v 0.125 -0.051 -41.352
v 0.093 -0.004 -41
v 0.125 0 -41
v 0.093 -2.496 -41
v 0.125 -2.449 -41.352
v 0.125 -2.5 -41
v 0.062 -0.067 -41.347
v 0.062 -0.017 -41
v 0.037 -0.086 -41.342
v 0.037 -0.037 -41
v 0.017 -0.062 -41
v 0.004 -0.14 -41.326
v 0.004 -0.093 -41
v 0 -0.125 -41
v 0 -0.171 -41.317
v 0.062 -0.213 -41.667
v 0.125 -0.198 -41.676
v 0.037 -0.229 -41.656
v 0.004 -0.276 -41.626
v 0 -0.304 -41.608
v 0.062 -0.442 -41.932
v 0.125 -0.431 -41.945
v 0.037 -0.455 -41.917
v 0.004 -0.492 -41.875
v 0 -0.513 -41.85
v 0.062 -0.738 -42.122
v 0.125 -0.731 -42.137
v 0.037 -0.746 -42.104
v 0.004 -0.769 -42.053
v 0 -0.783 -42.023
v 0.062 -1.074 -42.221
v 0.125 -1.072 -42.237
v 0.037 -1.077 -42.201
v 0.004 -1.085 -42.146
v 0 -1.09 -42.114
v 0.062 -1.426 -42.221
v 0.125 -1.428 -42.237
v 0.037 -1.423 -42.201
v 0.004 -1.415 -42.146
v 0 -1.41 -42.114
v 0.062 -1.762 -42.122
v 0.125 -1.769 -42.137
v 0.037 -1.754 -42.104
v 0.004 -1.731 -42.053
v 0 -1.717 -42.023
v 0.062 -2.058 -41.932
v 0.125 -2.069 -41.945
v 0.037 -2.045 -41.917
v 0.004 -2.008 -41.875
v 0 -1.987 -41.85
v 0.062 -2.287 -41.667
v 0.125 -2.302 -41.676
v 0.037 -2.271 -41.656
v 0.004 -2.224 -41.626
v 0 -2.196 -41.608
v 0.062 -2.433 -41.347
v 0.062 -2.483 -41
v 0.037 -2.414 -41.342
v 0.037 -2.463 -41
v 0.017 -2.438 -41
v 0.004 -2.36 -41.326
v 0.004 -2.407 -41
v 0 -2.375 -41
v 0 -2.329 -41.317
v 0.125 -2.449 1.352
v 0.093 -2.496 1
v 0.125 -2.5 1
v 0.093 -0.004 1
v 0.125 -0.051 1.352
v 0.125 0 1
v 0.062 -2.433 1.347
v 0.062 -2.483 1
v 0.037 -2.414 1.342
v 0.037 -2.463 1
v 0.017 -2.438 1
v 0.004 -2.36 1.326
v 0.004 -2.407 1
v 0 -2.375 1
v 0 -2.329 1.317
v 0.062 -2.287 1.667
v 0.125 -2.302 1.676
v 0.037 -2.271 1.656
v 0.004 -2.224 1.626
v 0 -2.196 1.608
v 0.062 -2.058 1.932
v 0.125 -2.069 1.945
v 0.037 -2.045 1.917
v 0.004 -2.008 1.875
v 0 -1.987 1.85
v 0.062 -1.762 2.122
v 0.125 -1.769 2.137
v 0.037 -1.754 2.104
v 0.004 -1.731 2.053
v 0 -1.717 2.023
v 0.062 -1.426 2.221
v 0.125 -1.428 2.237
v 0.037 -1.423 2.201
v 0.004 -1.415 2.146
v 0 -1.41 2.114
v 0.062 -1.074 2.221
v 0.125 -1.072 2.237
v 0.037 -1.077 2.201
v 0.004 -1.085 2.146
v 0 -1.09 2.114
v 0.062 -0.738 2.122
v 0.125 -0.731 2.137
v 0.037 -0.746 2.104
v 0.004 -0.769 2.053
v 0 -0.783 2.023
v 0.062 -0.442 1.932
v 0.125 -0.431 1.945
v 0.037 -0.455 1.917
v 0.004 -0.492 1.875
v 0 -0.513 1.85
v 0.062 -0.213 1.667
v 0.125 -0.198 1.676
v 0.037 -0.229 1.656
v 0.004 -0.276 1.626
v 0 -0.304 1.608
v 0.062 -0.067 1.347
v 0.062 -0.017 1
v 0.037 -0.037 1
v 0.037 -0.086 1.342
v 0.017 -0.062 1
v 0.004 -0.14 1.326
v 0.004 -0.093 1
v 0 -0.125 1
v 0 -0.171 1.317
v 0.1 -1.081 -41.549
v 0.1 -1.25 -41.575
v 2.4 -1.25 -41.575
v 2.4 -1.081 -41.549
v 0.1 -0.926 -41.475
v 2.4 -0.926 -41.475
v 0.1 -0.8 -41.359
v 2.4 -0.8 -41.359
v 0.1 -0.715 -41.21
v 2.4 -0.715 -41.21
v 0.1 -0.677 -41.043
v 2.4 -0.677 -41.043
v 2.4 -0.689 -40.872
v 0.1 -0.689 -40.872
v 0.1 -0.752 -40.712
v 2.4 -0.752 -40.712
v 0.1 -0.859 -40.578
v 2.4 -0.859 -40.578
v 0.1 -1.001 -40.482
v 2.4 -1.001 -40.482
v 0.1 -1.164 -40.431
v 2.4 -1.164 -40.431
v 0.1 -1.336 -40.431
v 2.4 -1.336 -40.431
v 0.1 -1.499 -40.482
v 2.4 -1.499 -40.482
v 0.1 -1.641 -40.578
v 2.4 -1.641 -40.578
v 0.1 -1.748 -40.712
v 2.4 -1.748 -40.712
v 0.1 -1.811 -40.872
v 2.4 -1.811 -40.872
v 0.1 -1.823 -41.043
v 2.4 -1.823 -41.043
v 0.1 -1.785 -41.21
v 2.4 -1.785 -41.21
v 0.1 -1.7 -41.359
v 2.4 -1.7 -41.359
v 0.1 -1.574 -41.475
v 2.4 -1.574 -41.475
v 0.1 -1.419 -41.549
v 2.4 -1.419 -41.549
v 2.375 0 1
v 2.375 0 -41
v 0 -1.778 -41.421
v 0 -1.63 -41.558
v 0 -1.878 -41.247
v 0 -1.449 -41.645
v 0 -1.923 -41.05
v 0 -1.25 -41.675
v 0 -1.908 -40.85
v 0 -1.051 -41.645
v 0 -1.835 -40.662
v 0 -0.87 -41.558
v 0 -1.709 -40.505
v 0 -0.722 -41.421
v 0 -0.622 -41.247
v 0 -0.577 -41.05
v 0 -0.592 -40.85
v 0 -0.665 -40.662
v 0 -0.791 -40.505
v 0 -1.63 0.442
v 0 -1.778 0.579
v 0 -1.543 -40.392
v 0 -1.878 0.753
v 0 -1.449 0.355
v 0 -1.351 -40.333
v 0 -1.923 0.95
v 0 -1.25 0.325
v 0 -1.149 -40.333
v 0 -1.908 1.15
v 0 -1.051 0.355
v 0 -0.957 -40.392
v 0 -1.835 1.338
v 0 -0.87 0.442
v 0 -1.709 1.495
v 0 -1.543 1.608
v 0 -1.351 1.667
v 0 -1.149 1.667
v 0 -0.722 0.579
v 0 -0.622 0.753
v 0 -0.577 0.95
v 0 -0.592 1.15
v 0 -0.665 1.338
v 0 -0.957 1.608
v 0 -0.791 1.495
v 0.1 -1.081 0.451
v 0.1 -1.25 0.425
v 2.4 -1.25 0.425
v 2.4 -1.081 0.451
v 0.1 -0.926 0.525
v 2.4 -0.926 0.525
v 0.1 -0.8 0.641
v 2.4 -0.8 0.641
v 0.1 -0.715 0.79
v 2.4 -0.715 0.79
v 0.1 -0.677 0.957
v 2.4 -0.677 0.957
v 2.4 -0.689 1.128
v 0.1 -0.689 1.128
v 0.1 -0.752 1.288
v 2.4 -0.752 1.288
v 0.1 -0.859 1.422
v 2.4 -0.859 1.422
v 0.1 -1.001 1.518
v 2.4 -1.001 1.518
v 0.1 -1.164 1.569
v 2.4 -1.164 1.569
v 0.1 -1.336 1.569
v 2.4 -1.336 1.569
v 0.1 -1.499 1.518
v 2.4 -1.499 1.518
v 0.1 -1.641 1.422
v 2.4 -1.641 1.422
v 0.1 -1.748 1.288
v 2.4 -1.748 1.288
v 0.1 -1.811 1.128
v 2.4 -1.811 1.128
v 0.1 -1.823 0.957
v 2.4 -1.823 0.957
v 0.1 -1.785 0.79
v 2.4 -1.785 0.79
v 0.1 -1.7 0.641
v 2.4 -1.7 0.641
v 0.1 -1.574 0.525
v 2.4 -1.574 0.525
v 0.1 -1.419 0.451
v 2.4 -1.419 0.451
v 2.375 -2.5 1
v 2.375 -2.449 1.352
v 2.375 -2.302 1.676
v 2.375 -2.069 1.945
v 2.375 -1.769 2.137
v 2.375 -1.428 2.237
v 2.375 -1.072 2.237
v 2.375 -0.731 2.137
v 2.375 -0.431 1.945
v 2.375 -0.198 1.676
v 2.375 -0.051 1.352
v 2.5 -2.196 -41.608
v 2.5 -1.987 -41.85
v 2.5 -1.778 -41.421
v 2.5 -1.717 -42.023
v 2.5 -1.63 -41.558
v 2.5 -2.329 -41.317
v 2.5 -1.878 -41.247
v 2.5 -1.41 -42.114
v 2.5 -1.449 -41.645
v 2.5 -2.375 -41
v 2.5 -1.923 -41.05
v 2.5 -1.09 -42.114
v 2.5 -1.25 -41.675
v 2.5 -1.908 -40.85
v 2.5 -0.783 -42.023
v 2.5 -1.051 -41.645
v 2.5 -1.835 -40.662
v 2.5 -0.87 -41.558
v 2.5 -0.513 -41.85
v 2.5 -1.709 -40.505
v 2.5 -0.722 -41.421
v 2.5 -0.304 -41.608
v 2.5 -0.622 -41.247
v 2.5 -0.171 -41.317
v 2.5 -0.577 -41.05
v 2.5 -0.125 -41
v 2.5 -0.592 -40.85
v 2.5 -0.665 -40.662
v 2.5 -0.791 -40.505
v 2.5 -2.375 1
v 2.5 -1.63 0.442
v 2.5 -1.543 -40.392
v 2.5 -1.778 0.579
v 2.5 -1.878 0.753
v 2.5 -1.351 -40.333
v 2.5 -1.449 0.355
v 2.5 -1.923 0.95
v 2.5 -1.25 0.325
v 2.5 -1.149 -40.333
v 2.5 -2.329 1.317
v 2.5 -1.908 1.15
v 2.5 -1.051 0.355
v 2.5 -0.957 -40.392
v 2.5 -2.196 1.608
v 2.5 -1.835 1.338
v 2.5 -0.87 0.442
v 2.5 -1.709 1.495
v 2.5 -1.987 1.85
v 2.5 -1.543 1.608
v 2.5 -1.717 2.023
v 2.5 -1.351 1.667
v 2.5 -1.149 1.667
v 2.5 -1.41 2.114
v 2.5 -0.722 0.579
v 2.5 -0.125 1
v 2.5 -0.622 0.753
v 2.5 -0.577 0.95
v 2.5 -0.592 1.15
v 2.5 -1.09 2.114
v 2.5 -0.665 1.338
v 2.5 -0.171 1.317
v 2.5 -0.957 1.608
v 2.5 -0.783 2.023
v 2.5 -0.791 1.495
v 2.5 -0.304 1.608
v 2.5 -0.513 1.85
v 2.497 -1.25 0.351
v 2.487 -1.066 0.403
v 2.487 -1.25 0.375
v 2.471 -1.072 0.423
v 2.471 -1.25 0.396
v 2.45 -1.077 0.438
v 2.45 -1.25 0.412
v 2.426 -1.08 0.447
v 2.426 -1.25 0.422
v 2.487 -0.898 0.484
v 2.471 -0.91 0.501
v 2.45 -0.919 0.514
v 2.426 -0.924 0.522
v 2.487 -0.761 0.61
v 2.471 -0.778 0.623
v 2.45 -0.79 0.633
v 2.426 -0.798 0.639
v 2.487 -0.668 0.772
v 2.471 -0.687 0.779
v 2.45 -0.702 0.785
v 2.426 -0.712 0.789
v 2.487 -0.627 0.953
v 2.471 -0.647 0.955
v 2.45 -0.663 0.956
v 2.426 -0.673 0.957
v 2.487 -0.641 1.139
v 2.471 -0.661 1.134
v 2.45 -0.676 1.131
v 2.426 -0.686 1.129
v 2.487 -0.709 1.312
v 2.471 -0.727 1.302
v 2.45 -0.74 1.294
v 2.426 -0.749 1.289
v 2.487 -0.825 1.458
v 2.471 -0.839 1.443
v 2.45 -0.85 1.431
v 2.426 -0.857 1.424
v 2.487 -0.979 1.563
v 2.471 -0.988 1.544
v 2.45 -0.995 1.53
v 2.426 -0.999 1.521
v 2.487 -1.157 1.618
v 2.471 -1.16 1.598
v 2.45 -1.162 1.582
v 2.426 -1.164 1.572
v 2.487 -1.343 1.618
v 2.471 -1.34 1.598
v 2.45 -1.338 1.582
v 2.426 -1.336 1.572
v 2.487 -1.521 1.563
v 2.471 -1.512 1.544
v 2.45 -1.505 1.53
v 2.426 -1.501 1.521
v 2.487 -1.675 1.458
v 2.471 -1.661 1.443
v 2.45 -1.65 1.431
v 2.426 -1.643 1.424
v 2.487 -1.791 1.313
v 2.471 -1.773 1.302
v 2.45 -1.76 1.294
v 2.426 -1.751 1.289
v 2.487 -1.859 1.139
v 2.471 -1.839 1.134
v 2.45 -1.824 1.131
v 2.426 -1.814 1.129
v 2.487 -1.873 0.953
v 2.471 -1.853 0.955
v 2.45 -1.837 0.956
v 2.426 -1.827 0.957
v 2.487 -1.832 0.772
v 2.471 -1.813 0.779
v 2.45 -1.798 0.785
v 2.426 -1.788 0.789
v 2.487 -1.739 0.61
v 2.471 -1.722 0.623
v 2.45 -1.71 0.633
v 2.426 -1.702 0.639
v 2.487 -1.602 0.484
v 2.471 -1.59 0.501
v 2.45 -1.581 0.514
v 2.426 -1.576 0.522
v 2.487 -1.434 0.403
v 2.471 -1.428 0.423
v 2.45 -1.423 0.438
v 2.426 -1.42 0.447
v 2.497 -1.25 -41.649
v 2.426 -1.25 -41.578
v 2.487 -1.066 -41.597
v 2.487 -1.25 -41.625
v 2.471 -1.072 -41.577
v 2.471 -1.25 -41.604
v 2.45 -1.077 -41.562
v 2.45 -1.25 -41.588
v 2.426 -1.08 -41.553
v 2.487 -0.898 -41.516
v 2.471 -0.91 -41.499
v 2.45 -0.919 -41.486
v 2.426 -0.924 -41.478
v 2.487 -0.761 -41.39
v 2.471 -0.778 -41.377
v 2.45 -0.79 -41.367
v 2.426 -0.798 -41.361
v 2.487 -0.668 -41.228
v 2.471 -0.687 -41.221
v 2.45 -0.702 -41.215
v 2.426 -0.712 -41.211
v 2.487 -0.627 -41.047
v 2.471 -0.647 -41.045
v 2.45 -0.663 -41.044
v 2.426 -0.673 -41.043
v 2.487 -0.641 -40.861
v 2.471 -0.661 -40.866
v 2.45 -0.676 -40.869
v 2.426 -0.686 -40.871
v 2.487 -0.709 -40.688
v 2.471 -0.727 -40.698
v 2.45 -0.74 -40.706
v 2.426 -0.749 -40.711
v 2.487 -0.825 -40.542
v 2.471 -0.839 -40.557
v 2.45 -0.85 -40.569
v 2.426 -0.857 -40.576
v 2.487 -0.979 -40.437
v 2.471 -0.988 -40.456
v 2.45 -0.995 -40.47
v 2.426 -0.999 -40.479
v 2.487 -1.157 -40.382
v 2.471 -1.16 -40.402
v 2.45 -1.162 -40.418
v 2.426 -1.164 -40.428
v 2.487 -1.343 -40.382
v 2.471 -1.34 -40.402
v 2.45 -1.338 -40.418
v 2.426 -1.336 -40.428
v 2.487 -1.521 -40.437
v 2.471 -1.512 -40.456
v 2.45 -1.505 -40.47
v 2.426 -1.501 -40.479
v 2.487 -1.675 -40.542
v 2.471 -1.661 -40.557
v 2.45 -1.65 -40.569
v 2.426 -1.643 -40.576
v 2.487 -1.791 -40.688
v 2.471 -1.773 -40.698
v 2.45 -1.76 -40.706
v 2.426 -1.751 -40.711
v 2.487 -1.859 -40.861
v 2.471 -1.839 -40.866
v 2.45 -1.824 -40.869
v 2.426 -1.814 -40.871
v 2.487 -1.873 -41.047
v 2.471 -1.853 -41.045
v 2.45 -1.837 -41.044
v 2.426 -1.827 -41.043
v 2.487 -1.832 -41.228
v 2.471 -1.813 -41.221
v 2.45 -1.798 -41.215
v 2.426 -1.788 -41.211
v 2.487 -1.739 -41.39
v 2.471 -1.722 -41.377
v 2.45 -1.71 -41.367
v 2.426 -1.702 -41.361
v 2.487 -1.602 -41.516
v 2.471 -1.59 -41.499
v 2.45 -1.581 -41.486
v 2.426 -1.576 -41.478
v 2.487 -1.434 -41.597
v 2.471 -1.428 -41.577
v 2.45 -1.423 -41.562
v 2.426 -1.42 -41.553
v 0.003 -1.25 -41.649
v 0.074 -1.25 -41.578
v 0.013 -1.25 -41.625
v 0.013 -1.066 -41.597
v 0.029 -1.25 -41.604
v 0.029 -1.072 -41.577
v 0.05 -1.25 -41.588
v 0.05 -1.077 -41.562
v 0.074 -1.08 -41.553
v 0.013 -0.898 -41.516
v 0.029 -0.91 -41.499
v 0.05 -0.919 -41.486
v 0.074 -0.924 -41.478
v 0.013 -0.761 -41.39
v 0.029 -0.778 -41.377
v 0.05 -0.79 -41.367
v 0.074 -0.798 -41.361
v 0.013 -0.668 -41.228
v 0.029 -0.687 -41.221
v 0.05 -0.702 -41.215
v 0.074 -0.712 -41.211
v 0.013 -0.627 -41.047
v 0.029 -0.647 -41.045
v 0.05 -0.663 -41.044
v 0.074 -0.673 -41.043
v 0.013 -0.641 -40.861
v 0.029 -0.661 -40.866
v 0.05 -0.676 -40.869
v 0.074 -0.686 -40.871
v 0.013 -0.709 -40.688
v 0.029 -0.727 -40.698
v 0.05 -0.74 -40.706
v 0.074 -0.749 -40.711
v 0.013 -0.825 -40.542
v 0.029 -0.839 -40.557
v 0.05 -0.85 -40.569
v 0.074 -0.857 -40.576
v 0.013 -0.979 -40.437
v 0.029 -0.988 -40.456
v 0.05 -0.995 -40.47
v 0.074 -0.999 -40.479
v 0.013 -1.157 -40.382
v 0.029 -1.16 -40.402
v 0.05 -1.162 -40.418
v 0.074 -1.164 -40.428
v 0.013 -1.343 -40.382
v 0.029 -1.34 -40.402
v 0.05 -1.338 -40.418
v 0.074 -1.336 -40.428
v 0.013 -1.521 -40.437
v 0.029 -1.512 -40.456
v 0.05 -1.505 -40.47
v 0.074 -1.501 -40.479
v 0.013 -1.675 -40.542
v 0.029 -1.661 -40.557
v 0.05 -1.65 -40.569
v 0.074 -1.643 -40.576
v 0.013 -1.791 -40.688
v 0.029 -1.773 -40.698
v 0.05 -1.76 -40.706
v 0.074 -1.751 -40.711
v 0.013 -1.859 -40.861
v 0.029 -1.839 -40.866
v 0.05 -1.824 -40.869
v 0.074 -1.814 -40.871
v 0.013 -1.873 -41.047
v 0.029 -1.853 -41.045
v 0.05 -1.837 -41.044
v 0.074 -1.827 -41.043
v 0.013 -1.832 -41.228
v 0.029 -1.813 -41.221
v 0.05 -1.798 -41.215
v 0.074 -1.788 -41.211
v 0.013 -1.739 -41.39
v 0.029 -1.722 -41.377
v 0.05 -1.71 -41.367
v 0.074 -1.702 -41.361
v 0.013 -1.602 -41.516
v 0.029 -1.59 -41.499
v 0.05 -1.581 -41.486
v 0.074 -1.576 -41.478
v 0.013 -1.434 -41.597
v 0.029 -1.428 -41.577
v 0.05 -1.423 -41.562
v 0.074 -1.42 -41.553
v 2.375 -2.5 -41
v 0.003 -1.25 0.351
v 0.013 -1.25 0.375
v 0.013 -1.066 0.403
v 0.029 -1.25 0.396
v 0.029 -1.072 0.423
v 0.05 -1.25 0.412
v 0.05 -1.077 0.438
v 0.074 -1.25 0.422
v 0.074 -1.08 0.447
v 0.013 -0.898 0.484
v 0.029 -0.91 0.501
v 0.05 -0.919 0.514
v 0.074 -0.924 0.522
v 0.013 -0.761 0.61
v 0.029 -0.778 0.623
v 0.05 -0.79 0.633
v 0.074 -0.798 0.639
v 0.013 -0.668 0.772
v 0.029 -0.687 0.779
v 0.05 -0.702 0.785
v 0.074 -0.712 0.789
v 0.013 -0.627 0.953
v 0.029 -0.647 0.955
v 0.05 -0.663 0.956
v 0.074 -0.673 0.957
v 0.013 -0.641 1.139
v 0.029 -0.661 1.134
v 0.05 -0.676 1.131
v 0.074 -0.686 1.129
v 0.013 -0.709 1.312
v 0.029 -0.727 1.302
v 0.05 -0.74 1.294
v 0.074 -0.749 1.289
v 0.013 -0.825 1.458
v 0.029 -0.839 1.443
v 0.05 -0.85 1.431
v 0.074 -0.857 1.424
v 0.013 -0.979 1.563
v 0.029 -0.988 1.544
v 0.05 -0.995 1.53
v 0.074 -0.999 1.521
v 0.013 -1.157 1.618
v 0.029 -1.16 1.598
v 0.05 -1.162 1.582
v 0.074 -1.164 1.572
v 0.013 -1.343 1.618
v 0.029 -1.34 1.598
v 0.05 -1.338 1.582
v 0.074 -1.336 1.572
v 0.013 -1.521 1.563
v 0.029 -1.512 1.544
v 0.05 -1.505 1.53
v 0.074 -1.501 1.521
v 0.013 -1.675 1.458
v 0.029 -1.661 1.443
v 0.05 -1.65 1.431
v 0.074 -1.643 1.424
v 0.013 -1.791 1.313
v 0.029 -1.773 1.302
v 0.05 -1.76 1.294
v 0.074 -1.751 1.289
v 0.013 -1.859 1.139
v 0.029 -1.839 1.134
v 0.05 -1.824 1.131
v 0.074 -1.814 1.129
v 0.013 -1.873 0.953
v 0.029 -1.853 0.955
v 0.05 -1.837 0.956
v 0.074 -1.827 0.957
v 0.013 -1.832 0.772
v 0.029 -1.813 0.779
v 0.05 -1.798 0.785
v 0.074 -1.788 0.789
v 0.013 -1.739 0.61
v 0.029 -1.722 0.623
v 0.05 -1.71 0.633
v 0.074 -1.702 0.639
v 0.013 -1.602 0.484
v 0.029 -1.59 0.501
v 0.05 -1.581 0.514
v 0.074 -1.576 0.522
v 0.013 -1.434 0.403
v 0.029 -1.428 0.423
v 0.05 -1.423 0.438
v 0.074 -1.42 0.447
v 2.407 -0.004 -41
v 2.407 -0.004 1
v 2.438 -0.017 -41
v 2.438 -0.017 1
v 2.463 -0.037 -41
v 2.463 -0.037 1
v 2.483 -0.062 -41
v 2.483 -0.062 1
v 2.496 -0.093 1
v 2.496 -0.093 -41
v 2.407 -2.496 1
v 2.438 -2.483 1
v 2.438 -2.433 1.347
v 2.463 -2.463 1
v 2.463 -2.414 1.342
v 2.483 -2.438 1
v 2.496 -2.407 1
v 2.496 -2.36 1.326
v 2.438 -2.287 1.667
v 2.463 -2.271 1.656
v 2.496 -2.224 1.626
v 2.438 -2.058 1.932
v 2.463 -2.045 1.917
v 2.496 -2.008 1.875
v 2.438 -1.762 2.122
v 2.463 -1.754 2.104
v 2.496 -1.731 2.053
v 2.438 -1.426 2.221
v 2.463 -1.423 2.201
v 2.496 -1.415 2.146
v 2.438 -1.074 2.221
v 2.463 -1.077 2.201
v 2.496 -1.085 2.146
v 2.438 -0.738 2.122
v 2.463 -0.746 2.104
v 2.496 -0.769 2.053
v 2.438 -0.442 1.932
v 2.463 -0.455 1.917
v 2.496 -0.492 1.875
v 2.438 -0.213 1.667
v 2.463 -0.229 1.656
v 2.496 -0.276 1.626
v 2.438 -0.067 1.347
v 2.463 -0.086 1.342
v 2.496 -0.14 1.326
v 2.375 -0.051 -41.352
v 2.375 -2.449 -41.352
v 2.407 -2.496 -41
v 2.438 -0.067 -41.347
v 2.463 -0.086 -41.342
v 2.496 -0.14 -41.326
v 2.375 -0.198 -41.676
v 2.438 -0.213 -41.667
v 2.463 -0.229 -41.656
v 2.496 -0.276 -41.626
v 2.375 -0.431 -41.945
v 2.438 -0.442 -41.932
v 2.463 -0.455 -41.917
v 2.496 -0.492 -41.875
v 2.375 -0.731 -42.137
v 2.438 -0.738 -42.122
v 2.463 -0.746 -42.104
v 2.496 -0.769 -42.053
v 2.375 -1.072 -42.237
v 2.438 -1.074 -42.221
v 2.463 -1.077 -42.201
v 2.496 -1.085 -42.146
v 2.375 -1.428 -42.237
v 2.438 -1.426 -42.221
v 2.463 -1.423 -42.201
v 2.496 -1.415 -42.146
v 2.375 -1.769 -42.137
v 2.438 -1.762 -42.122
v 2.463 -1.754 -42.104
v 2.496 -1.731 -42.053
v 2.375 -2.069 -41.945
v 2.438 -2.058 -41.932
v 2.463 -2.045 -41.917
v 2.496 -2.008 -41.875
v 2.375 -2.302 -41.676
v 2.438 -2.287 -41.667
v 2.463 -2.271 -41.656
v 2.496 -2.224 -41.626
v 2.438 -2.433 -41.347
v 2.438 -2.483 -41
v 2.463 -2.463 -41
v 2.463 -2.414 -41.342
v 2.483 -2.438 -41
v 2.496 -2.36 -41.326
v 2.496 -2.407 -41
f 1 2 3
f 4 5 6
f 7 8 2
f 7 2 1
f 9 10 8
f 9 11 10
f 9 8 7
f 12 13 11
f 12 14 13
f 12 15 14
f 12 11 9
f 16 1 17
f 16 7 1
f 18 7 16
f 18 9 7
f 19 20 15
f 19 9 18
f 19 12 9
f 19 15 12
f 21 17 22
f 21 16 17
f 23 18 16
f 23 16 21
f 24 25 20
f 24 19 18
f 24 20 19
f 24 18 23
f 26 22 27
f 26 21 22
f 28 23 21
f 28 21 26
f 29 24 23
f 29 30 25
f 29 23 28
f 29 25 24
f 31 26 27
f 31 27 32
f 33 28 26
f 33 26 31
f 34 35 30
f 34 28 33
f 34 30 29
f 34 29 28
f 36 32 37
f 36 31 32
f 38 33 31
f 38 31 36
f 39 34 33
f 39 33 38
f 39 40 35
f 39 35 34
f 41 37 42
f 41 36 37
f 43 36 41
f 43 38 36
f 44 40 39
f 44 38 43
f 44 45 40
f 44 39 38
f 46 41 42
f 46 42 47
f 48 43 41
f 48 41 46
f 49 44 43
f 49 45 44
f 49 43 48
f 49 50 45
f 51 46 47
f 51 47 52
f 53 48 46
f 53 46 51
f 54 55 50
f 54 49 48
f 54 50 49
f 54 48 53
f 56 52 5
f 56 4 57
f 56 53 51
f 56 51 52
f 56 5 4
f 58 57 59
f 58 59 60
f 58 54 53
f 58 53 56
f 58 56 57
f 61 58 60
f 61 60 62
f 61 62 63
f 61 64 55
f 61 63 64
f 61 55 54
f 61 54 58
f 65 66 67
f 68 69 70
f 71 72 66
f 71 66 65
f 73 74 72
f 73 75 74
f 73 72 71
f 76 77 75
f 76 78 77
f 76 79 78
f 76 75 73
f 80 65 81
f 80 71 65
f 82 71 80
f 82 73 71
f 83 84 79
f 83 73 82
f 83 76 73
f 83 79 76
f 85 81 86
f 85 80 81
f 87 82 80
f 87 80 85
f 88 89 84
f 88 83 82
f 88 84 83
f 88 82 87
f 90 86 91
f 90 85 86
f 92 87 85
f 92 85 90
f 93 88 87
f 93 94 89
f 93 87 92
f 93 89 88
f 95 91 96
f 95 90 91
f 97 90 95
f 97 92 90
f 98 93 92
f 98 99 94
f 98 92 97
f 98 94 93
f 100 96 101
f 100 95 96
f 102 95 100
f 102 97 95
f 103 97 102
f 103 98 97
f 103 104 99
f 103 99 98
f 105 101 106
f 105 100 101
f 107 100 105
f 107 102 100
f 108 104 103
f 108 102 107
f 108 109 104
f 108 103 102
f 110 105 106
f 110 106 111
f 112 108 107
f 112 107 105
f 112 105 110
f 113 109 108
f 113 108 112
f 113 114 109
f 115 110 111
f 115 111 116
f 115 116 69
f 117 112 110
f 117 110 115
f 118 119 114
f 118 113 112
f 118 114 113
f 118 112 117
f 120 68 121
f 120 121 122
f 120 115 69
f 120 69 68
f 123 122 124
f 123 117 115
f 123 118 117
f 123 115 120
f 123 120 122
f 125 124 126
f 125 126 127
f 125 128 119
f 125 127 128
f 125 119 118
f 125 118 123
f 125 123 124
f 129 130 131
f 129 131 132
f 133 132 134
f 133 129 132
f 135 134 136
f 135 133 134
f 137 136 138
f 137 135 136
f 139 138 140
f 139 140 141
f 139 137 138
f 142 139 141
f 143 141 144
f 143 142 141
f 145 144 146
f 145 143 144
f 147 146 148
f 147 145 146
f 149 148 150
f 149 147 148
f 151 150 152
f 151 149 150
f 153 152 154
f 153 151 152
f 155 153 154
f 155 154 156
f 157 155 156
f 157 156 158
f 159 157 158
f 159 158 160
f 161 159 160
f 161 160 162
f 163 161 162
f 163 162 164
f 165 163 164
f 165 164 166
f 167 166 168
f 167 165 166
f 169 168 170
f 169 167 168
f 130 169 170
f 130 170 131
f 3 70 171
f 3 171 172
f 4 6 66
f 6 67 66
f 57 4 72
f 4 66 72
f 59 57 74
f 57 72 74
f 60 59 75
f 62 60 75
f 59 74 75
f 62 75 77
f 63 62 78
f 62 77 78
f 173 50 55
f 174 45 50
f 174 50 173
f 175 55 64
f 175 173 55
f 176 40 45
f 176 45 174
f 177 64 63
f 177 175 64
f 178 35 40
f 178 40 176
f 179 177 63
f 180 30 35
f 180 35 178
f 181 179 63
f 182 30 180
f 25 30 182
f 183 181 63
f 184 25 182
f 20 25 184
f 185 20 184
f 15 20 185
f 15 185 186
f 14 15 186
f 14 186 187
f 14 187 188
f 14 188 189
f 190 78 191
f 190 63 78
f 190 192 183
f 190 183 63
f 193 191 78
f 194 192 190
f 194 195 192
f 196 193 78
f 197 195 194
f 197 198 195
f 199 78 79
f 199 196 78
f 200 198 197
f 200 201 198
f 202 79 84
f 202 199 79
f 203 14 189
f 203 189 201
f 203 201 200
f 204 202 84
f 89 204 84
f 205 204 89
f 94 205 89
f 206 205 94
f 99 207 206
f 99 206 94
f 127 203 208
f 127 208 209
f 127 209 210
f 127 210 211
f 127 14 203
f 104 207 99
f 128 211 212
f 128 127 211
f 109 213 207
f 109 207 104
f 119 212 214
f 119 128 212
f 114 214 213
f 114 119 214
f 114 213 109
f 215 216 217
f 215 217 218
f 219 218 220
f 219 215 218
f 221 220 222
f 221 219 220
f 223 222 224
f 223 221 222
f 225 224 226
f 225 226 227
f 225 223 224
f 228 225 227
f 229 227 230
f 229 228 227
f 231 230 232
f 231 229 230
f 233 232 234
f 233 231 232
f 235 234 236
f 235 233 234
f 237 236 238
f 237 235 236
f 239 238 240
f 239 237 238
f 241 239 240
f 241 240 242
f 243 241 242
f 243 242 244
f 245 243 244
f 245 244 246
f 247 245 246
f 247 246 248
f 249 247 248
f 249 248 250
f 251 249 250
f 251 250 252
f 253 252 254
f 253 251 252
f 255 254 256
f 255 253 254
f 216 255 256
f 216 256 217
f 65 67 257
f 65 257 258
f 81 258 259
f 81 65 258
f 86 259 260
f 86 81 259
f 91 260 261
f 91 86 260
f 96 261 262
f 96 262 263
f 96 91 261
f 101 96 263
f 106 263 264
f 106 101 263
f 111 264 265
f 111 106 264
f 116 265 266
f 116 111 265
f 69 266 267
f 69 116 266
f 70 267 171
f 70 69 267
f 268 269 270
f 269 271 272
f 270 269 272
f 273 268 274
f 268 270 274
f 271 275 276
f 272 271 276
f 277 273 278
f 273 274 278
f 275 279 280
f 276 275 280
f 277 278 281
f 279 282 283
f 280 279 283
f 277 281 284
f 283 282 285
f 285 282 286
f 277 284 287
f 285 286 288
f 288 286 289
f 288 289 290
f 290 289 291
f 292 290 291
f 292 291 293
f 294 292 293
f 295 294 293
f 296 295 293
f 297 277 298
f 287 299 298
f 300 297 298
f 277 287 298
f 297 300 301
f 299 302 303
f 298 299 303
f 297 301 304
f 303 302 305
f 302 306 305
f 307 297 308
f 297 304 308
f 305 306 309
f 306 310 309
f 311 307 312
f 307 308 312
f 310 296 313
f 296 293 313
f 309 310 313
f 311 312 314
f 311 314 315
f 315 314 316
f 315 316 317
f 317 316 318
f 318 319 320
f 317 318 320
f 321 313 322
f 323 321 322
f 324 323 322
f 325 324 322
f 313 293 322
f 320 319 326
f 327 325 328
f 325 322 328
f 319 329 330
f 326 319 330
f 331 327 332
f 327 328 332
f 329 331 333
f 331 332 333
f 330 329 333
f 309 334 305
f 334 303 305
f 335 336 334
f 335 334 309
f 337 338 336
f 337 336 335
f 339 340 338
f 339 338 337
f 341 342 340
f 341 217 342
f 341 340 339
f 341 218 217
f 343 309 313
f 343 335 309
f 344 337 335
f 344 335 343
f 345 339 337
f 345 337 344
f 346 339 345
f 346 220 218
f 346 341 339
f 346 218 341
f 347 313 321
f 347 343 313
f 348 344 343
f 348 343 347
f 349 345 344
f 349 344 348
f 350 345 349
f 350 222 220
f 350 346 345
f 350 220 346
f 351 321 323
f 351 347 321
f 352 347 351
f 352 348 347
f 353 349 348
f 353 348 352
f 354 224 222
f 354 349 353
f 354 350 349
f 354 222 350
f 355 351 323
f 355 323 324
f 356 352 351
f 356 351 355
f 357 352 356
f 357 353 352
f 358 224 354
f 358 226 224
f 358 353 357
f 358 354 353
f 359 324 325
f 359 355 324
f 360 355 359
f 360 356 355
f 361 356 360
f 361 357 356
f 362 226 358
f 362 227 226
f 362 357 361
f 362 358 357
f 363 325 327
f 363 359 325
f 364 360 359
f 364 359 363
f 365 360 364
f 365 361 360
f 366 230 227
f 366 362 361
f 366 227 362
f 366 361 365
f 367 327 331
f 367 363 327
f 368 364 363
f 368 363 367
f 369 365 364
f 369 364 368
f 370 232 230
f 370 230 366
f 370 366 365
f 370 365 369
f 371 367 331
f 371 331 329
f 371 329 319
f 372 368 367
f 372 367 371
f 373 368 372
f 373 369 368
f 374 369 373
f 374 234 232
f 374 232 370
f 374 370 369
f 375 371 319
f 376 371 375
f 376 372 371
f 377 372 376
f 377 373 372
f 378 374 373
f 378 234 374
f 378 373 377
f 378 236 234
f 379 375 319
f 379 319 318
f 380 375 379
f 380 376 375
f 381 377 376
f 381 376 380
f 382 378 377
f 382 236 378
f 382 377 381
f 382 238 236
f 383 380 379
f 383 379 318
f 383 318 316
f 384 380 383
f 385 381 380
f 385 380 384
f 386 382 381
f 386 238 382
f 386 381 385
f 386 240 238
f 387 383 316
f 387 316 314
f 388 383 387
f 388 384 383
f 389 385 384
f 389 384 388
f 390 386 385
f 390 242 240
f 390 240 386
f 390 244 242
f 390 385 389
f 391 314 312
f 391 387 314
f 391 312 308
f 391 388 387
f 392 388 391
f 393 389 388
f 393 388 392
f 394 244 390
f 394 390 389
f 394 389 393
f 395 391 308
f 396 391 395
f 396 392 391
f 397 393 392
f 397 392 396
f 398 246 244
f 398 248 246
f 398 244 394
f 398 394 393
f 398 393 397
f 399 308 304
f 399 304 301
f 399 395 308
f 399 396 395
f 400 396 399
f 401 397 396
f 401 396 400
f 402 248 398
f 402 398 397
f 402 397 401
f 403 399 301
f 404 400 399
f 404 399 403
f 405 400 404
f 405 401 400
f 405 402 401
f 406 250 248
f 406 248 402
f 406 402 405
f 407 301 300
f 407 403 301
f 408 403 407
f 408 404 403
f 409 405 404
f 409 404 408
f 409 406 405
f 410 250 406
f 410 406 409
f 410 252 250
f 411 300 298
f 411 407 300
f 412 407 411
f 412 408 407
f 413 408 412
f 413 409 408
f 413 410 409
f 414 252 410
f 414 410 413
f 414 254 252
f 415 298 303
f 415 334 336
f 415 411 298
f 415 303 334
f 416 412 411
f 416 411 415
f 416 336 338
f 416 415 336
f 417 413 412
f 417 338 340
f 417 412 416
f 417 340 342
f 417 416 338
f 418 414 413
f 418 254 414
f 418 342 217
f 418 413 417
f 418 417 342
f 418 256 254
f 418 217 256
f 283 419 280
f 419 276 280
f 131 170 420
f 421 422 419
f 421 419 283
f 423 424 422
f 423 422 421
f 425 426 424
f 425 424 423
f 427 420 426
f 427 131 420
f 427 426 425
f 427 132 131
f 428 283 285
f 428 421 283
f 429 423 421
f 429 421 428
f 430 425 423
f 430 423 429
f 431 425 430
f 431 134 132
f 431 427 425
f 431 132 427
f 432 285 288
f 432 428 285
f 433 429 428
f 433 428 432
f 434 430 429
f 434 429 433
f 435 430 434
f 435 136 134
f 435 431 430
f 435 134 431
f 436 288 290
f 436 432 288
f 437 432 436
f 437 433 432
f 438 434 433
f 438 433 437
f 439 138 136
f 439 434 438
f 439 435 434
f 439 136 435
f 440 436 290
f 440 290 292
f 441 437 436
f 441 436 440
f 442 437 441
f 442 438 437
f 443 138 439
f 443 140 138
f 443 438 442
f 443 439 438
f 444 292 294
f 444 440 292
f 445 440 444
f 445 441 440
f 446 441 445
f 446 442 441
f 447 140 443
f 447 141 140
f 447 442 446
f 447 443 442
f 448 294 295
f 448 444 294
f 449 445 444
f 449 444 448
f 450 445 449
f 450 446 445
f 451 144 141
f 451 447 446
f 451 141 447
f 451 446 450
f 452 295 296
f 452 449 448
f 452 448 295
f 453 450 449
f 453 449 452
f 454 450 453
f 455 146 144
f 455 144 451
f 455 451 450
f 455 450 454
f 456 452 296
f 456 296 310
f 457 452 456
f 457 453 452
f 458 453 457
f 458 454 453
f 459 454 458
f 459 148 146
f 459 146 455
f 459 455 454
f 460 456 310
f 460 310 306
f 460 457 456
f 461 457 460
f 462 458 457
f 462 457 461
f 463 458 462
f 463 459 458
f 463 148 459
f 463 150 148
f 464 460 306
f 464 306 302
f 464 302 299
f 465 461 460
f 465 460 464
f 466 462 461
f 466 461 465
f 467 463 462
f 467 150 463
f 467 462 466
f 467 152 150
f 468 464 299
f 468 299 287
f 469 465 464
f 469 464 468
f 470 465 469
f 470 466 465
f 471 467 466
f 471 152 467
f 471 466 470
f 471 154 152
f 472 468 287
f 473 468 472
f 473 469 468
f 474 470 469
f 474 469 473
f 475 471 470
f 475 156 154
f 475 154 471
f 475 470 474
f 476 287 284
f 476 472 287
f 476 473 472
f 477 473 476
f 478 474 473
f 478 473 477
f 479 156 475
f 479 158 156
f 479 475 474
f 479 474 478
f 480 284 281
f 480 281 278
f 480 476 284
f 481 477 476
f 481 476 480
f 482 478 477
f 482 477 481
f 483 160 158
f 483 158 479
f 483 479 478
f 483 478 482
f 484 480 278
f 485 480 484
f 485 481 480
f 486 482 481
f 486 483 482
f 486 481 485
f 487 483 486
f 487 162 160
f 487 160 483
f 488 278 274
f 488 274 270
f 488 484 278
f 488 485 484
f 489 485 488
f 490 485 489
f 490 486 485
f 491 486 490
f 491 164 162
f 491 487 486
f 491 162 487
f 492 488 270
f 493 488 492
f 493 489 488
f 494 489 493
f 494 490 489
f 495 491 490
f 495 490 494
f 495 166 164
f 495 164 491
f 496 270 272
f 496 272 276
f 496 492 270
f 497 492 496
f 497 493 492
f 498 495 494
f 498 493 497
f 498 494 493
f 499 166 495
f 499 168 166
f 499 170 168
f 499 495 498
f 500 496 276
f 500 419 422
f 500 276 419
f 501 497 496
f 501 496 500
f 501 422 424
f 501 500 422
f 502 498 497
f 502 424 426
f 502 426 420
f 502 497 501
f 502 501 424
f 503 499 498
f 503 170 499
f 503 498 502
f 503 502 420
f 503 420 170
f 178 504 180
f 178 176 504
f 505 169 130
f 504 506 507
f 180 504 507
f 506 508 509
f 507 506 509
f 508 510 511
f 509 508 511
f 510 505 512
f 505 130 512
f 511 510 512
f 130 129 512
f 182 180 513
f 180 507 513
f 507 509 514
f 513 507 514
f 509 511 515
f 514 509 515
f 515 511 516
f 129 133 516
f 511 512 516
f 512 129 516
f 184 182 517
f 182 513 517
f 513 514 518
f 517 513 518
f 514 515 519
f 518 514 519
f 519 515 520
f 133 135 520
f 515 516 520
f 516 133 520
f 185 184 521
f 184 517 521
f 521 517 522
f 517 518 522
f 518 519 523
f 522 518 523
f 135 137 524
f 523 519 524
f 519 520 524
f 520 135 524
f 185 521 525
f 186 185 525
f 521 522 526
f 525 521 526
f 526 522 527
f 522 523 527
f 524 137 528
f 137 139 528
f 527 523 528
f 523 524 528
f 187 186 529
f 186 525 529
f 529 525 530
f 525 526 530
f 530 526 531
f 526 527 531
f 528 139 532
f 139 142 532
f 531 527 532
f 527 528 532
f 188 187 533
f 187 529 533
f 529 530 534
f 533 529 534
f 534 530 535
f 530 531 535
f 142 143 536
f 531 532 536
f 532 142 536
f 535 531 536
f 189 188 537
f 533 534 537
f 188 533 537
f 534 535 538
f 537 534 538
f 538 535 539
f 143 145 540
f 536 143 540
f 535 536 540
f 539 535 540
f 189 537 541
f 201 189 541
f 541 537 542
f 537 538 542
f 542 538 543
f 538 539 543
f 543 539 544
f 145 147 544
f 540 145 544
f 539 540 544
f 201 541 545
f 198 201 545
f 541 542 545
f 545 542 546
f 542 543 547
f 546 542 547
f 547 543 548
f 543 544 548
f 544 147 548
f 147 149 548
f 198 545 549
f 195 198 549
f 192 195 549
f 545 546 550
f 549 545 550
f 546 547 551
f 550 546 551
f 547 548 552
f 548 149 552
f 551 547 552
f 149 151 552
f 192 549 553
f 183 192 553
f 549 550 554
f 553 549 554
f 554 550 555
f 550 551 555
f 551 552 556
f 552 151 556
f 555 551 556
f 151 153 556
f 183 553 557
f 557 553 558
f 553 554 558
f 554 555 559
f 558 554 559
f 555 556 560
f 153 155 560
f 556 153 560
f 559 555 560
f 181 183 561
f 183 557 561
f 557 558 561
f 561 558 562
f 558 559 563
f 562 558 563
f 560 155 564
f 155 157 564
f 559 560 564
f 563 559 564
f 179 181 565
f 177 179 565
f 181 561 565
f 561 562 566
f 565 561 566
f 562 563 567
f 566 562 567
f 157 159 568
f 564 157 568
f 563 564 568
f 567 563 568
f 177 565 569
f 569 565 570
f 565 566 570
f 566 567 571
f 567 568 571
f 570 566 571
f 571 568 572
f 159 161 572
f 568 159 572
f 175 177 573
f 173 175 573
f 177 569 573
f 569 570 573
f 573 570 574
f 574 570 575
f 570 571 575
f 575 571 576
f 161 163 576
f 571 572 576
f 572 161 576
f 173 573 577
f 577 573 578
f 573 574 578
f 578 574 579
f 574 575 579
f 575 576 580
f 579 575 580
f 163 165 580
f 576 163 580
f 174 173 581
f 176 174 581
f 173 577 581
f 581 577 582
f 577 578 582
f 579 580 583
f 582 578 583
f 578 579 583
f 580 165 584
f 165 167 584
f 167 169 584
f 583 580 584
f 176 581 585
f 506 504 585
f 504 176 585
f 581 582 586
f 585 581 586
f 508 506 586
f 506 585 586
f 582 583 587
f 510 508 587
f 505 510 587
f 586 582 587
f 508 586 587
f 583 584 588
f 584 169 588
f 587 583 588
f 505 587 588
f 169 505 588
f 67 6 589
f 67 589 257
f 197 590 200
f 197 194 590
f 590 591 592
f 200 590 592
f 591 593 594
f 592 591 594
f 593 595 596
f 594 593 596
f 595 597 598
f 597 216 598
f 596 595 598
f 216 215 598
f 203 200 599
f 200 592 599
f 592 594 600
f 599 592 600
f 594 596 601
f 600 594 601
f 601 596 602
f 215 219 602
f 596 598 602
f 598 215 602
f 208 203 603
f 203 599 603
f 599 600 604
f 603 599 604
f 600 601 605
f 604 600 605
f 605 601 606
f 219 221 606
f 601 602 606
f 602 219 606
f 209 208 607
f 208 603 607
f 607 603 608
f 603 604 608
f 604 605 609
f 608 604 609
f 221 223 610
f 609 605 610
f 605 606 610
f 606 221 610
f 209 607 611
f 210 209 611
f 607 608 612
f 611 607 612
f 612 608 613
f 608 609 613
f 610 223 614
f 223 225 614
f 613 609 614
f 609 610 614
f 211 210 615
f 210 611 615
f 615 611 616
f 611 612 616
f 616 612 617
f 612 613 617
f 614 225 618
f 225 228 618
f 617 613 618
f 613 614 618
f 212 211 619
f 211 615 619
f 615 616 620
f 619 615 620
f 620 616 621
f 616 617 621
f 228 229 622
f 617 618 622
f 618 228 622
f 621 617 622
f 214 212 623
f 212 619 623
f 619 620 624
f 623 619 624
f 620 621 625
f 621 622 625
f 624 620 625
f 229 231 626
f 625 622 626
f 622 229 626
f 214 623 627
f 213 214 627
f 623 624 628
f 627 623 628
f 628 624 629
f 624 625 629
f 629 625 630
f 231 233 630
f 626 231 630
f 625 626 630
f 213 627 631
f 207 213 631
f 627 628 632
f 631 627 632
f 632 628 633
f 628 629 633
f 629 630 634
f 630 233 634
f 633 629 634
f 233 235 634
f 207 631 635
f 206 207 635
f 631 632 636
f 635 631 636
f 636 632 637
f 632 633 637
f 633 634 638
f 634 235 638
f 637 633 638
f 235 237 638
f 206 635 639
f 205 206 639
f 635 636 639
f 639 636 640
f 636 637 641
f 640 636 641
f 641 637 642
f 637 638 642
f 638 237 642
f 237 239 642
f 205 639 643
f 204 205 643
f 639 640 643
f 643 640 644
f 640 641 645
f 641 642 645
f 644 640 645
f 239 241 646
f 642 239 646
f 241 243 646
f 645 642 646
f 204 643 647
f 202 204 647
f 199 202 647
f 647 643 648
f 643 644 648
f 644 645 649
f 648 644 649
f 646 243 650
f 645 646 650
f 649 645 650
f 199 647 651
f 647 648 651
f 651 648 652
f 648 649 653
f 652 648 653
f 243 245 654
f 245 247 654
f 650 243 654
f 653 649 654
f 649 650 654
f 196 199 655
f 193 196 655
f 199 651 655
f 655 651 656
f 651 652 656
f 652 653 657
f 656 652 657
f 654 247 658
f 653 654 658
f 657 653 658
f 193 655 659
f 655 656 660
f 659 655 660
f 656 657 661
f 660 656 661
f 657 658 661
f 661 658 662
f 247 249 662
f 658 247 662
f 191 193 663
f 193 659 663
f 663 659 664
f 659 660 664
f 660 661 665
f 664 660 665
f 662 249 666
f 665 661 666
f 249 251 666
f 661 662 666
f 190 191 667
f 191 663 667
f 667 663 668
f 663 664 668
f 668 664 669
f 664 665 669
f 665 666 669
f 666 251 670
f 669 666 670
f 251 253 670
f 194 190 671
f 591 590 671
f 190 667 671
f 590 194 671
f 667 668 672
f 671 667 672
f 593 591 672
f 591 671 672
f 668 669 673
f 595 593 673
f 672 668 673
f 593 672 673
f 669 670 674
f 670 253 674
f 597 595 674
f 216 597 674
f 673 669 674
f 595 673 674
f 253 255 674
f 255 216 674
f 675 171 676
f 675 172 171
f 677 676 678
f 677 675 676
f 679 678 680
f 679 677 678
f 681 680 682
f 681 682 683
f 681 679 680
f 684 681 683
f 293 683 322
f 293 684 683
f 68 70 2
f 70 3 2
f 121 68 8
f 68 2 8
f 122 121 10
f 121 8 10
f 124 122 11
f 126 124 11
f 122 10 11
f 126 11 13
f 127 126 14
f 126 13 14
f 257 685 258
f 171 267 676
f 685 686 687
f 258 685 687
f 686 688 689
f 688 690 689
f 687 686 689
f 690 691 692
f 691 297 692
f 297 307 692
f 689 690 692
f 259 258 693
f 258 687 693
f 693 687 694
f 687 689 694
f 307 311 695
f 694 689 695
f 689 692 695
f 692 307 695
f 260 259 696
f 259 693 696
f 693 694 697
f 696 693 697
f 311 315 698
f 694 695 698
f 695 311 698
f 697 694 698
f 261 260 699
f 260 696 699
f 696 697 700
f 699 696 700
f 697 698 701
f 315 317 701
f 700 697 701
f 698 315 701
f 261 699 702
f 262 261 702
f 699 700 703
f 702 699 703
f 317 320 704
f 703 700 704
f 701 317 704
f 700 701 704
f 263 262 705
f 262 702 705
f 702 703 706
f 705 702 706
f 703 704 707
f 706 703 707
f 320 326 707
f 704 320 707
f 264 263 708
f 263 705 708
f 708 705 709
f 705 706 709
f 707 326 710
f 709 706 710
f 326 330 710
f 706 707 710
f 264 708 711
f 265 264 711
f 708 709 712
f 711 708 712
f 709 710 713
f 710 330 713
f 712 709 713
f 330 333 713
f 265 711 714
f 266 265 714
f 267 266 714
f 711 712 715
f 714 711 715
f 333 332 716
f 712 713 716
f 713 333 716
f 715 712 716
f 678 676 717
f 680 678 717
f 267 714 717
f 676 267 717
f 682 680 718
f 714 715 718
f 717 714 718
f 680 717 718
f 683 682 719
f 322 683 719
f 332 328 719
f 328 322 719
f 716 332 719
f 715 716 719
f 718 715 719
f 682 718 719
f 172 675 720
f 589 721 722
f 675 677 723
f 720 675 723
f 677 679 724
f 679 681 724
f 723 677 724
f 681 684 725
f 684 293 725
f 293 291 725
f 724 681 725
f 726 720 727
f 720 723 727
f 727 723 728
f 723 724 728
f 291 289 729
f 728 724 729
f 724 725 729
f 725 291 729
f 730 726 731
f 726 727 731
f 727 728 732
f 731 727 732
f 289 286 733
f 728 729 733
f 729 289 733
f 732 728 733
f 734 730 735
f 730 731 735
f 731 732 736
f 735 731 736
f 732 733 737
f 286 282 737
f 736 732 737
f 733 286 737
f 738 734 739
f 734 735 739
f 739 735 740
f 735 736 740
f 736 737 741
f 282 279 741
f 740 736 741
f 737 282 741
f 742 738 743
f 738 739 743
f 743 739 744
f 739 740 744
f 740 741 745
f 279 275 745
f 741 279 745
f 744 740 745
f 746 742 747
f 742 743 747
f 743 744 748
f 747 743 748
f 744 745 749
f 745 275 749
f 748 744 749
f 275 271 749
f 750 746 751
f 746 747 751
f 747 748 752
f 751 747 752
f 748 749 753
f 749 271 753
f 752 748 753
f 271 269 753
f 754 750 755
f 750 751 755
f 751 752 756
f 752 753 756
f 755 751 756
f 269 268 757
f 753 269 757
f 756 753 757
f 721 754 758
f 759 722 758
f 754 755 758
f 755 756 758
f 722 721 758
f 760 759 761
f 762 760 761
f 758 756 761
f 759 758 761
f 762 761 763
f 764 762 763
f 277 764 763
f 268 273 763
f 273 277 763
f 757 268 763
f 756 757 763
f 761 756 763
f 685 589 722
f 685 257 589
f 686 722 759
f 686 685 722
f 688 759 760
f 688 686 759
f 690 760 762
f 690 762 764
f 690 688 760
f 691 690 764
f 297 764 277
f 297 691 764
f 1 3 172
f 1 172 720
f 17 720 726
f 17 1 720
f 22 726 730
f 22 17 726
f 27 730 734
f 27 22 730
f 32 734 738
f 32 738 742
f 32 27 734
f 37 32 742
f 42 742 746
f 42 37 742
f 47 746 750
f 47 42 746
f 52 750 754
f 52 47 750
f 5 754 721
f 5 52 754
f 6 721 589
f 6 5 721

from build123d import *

# Parameters (mm, degrees)
SKETCH1_R           = 0.575
BOSS_EXTRUDE1_DEPTH = 2.5
FILLET1_R           = 0.125
FILLET2_R           = 0.1


with BuildPart() as part:
    # Sketch1 → Boss-Extrude1 (new body)
    with BuildSketch(Plane(origin=(0, 0, 0), x_dir=(0, 0, -1), z_dir=(1, 0, 0))):
        with BuildLine():
            ThreePointArc((41, 0), (42.25, -1.25), (41, -2.5))
            Line((41, -2.5), (40, -2.5))
            Line((40, -2.5), (0, -2.5))
            Line((0, -2.5), (-1, -2.5))
            ThreePointArc((-1, -2.5), (-2.25, -1.25), (-1, 0))
            Line((-1, 0), (0, 0))
            Line((0, 0), (40, 0))
            Line((40, 0), (41, 0))
        make_face()
        with Locations((41, -1.25)):
            Circle(SKETCH1_R, mode=Mode.SUBTRACT)
        with Locations((-1, -1.25)):
            Circle(SKETCH1_R, mode=Mode.SUBTRACT)
    extrude(amount=BOSS_EXTRUDE1_DEPTH)

    # Fillet1
    fillet1_edges = [part.edges().sort_by_distance(p)[0] for p in [
        (0, -1.25, 2.25),
        (0, 0, -20),
        (0, -1.25, -42.25),
        (2.5, 0, -20),
        (2.5, -1.25, 2.25),
        (2.5, -2.5, -20),
        (2.5, -1.25, -42.25),
        (0, -2.5, -20),
    ]]
    fillet(fillet1_edges, radius=FILLET1_R)

    # Fillet2
    fillet2_edges = [part.edges().sort_by_distance(p)[0] for p in [
        (2.5, -1.25, -40.425),
        (2.5, -1.25, 1.575),
        (0, -1.25, 1.575),
        (0, -1.25, -40.425),
    ]]
    fillet(fillet2_edges, radius=FILLET2_R)


solid = part.part
